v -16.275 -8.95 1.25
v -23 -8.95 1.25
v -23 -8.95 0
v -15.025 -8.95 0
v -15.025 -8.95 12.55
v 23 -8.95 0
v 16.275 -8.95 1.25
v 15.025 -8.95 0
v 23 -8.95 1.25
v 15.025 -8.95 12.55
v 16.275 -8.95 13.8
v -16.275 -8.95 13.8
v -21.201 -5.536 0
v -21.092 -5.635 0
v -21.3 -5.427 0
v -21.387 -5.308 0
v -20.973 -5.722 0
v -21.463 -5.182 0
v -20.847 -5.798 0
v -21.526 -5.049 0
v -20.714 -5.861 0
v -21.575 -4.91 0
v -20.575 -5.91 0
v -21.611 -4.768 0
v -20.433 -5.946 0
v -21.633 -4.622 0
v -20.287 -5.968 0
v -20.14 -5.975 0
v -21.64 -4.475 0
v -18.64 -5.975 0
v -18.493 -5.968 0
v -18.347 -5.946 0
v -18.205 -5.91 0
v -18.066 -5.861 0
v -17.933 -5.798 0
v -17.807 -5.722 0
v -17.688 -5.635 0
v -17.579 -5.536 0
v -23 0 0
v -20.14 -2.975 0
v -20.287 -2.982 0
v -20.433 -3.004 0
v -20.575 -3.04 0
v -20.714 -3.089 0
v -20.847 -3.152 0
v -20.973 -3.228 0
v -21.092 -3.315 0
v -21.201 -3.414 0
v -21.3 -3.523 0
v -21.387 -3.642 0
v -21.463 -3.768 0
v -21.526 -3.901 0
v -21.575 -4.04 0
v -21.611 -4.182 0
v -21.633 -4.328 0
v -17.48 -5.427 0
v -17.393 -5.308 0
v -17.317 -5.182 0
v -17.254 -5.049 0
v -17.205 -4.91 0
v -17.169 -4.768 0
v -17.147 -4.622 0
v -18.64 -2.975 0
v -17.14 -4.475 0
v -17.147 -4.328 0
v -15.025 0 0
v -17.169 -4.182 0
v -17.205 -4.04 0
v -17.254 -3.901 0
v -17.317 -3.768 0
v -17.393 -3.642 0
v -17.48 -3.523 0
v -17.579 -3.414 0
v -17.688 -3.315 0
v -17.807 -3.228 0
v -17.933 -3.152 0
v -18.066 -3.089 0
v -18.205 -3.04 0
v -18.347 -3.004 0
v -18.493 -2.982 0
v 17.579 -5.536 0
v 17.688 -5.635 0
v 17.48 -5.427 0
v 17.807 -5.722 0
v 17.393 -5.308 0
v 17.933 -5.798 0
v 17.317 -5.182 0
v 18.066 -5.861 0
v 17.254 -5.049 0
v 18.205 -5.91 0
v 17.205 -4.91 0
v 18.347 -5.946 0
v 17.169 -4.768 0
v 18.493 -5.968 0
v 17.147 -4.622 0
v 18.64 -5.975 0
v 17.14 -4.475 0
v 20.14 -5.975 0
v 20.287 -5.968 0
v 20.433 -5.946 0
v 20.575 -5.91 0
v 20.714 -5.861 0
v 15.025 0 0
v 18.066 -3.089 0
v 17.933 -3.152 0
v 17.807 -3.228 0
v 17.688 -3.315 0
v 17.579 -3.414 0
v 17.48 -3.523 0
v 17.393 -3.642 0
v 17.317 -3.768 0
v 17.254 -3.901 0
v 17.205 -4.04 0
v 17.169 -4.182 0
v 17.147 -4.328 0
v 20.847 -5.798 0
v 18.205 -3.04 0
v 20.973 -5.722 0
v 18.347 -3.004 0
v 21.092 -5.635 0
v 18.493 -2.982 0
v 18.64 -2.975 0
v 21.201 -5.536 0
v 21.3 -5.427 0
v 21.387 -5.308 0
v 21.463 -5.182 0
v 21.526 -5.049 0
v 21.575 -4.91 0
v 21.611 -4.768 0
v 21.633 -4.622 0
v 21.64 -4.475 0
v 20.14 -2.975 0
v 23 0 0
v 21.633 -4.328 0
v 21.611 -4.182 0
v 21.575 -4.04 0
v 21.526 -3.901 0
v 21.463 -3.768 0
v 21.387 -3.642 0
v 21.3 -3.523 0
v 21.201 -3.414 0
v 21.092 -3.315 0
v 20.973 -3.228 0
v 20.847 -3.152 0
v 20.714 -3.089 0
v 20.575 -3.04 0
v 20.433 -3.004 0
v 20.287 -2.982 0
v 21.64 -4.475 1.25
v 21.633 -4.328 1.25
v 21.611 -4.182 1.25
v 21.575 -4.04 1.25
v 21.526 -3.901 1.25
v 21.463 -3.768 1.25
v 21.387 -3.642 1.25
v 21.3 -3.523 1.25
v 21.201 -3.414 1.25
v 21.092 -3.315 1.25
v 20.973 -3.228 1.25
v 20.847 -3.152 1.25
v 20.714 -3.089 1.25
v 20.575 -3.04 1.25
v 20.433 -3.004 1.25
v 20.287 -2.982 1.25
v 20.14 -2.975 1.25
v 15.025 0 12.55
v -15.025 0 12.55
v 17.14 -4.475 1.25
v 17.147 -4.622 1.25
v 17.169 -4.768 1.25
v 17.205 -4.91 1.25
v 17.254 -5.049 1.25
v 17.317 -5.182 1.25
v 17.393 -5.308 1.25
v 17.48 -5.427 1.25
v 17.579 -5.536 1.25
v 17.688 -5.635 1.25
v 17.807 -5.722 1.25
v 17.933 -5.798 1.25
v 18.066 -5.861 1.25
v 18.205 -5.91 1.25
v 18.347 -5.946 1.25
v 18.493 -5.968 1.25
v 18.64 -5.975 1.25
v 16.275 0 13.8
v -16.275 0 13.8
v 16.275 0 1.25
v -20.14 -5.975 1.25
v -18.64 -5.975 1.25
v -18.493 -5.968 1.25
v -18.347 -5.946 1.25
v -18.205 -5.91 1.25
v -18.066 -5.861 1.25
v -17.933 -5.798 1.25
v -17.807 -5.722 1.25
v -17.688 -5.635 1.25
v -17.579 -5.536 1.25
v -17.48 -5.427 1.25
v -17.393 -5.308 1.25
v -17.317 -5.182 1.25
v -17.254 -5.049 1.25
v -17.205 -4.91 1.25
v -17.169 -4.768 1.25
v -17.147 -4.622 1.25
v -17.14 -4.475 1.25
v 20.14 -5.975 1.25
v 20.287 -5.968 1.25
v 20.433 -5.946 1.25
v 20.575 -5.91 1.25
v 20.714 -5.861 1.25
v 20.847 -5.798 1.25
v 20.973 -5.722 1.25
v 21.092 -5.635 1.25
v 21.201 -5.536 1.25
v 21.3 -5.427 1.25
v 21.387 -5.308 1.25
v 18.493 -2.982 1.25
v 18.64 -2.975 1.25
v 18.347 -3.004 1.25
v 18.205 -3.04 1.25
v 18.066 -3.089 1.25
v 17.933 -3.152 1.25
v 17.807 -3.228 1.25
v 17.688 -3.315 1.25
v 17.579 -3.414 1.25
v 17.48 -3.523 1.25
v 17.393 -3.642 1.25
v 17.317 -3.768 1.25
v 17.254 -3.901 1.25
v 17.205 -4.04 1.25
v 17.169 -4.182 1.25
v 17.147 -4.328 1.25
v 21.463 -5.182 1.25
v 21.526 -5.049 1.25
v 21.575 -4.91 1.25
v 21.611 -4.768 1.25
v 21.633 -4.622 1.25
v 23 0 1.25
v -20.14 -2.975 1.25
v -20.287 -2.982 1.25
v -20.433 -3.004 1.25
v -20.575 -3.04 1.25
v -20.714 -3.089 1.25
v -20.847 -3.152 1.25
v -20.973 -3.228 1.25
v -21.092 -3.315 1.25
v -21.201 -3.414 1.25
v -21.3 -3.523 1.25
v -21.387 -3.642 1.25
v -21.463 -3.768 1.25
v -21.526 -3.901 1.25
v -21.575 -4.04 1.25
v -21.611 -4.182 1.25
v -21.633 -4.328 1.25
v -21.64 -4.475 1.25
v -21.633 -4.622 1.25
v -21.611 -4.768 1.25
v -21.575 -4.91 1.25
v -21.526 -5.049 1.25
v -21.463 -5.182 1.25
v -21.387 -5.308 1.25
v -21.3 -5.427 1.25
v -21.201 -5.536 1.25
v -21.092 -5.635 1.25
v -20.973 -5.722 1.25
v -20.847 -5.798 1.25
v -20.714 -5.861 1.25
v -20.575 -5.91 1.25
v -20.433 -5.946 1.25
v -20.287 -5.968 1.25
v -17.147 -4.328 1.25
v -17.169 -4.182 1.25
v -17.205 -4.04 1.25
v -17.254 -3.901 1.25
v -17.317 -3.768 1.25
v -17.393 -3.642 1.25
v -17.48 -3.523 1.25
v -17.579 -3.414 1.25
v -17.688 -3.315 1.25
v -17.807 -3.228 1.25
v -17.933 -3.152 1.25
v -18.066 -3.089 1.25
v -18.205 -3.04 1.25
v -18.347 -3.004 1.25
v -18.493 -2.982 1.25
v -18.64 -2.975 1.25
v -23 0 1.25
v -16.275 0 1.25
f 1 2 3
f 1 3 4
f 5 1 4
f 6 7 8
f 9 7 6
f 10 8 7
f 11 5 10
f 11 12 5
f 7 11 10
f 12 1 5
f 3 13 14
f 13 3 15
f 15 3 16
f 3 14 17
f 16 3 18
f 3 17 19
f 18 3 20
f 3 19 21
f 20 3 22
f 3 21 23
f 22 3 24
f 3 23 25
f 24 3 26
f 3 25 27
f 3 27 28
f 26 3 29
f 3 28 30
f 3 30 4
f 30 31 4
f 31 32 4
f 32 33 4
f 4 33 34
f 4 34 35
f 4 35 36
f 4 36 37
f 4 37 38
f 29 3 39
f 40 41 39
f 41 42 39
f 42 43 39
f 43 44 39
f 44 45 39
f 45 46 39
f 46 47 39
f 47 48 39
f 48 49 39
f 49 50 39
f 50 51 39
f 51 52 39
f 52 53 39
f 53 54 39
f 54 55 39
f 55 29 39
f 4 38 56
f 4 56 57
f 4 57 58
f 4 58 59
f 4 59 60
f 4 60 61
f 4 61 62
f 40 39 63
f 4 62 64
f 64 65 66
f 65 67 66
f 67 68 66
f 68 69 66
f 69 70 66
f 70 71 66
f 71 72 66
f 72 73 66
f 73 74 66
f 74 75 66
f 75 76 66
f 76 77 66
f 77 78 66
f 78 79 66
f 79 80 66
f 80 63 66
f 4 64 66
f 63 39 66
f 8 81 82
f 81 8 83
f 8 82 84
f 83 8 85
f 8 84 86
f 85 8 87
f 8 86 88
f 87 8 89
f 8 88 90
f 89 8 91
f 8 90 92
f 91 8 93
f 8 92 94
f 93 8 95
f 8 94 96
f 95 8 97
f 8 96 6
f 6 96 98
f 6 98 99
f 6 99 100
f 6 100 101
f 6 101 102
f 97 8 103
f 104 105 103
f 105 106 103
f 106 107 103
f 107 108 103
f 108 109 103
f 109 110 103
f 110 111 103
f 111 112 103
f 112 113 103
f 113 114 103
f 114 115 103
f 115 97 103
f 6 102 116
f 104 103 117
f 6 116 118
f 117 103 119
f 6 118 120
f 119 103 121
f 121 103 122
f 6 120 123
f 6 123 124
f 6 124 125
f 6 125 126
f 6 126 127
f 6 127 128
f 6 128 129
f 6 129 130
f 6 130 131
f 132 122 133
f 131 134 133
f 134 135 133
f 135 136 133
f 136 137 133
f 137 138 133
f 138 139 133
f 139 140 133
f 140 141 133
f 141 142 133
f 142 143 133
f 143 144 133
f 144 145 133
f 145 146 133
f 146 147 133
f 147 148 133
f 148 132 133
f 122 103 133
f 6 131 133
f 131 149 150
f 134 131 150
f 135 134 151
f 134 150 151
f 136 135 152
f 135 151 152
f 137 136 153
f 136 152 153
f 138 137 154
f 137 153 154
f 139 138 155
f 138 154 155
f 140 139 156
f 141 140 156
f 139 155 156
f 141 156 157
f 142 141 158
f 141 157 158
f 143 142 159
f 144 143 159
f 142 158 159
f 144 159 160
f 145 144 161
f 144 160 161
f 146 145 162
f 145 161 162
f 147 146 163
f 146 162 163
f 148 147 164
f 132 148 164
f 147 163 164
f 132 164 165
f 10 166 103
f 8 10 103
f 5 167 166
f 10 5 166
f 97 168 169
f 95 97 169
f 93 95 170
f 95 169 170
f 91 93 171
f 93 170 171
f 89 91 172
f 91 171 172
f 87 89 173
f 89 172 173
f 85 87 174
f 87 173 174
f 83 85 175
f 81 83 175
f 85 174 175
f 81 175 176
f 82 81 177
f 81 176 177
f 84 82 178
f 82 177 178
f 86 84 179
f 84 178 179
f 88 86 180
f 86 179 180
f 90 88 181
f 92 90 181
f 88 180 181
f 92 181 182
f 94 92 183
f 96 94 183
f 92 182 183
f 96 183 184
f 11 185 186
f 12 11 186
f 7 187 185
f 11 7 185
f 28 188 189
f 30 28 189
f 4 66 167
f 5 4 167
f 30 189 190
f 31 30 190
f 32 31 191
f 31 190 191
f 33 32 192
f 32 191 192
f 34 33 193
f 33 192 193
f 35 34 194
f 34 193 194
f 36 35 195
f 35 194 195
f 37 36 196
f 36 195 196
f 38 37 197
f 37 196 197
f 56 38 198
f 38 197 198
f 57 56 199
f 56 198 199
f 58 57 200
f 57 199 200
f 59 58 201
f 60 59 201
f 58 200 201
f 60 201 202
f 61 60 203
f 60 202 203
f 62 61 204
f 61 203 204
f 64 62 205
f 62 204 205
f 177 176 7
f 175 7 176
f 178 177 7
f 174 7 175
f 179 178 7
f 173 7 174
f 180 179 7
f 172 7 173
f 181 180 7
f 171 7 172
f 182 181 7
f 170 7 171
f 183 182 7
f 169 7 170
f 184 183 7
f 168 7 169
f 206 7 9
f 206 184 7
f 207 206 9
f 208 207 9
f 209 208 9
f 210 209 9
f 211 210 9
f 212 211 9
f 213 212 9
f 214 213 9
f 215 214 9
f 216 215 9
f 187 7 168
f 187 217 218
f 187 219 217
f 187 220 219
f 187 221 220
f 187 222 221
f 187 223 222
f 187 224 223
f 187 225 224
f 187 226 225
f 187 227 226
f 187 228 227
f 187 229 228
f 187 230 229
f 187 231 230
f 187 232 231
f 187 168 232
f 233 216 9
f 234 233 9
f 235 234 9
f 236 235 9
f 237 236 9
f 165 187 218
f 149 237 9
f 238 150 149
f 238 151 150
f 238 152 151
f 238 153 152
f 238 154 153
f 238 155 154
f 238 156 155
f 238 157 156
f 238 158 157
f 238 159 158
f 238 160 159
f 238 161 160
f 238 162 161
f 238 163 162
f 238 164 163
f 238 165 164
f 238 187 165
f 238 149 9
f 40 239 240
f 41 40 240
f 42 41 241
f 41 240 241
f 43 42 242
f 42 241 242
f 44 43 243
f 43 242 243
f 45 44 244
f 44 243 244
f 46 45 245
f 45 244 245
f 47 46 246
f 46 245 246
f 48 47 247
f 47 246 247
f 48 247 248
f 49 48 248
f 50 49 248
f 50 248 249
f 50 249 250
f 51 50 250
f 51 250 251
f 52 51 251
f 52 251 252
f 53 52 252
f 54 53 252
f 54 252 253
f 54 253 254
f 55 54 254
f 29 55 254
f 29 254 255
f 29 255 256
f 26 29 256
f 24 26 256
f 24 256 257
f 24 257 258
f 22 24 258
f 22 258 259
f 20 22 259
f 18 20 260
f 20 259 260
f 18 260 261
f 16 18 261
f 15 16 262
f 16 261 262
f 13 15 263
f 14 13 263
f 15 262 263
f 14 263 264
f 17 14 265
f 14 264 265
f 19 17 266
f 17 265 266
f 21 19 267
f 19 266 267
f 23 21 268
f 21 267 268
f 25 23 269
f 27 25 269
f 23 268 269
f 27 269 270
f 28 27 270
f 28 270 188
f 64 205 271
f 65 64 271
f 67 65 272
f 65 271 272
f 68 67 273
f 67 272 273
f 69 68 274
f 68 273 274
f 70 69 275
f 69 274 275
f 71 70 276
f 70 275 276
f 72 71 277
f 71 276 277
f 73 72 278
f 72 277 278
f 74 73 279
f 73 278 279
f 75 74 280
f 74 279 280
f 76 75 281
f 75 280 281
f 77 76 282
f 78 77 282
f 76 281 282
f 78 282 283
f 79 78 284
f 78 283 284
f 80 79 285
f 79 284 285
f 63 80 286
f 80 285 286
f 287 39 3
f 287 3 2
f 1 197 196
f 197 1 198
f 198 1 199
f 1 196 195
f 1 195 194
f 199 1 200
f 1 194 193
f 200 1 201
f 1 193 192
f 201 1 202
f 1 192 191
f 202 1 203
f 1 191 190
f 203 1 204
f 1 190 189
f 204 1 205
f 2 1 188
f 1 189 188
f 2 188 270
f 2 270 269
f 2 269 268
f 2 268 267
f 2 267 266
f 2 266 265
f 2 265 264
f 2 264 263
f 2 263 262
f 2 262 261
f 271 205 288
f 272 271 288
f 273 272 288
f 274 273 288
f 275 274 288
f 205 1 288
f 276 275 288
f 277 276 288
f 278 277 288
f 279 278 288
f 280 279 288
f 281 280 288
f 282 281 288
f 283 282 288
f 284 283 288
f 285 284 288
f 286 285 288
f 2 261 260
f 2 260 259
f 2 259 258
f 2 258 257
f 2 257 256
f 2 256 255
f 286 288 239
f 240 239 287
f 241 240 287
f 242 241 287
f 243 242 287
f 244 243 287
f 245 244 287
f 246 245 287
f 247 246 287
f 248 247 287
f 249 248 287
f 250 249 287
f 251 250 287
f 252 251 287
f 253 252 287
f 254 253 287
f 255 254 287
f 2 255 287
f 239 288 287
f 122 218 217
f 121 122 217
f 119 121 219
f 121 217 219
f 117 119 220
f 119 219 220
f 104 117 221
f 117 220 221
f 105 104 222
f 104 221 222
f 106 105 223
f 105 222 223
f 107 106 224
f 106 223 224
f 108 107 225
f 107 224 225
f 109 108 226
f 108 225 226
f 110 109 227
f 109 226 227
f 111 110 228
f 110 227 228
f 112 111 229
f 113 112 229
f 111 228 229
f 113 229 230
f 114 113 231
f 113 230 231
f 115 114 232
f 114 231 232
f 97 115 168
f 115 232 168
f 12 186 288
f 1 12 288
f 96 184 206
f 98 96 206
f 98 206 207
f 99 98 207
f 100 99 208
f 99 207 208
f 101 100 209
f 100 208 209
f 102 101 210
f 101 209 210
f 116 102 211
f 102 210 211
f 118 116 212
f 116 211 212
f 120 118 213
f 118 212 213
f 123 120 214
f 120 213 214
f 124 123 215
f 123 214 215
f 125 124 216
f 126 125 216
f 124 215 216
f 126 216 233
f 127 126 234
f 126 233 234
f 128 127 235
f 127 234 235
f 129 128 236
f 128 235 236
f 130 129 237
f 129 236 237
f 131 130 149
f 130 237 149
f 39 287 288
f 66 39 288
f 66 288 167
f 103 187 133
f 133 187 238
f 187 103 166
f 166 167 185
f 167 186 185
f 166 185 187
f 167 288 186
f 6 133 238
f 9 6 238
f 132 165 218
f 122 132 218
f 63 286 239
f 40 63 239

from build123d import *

# Parameters (mm, degrees)
F0_W     = 6.725
F0_H     = 1.25
F0_W_2   = 1.25
F1_DEPTH = 8.95
F3_DEPTH = 25


with BuildPart() as f1:
    # F0 (on Front) → F1 (new body)
    with BuildSketch(Plane.XZ):
        with Locations((-19.6375, 0.625)):
            Rectangle(F0_W, F0_H)
        with Locations((-15.65, 0.625)):
            Rectangle(F0_W_2, F0_H)
        Polygon((-16.275, 13.8), (-16.275, 1.25), (-15.025, 1.25), (-15.025, 12.55), (15.025, 12.55), (15.025, 1.25), (16.275, 1.25), (16.275, 13.8), align=None)
        with Locations((15.65, 0.625)):
            Rectangle(F0_W_2, F0_H)
        with Locations((19.6375, 0.625)):
            Rectangle(F0_W, F0_H)
    extrude(amount=F1_DEPTH)

    # F2 (on face) → F3 (cut)
    with BuildSketch(Plane.XY.offset(1.25)):
        with BuildLine():
            ThreePointArc((-19.39, -3.1759618943), (-19.0282285677, -3.0261112606), (-18.64, -2.975))
            Line((-18.64, -2.975), (-20.14, -2.975))
            ThreePointArc((-20.14, -2.975), (-19.7517714323, -3.0261112606), (-19.39, -3.1759618943))
        make_face()
        with BuildLine():
            ThreePointArc((-19.39, -5.7740381057), (-20.14, -4.475), (-19.39, -3.1759618943))
            ThreePointArc((-19.39, -3.1759618943), (-19.7517714323, -3.0261112606), (-20.14, -2.975))
            ThreePointArc((-20.14, -2.975), (-21.64, -4.475), (-20.14, -5.975))
            ThreePointArc((-20.14, -5.975), (-19.7517714323, -5.9238887394), (-19.39, -5.7740381057))
        make_face()
        with BuildLine():
            ThreePointArc((-19.39, -5.7740381057), (-18.8409618943, -5.225), (-18.64, -4.475))
            ThreePointArc((-18.64, -4.475), (-18.8409618943, -3.725), (-19.39, -3.1759618943))
            ThreePointArc((-19.39, -3.1759618943), (-20.14, -4.475), (-19.39, -5.7740381057))
        make_face()
        with BuildLine():
            Line((-18.64, -4.475), (-17.14, -4.475))
            ThreePointArc((-17.14, -4.475), (-17.5793398282, -3.4143398282), (-18.64, -2.975))
            ThreePointArc((-18.64, -2.975), (-19.0282285677, -3.0261112606), (-19.39, -3.1759618943))
            ThreePointArc((-19.39, -3.1759618943), (-18.8409618943, -3.725), (-18.64, -4.475))
        make_face()
        with BuildLine():
            ThreePointArc((-18.64, -5.975), (-17.5793398282, -5.5356601718), (-17.14, -4.475))
            Line((-17.14, -4.475), (-18.64, -4.475))
            ThreePointArc((-18.64, -4.475), (-18.8409618943, -5.225), (-19.39, -5.7740381057))
            ThreePointArc((-19.39, -5.7740381057), (-19.0282285677, -5.9238887394), (-18.64, -5.975))
        make_face()
        with BuildLine():
            Line((-20.14, -5.975), (-18.64, -5.975))
            ThreePointArc((-18.64, -5.975), (-19.0282285677, -5.9238887394), (-19.39, -5.7740381057))
            ThreePointArc((-19.39, -5.7740381057), (-19.7517714323, -5.9238887394), (-20.14, -5.975))
        make_face()
        with BuildLine():
            Line((20.14, -2.975), (18.64, -2.975))
            ThreePointArc((18.64, -2.975), (19.0282285677, -3.0261112606), (19.39, -3.1759618943))
            ThreePointArc((19.39, -3.1759618943), (19.7517714323, -3.0261112606), (20.14, -2.975))
        make_face()
        with BuildLine():
            ThreePointArc((18.64, -2.975), (17.5793398282, -3.4143398282), (17.14, -4.475))
            Line((17.14, -4.475), (18.64, -4.475))
            ThreePointArc((18.64, -4.475), (18.8409618943, -3.725), (19.39, -3.1759618943))
            ThreePointArc((19.39, -3.1759618943), (19.0282285677, -3.0261112606), (18.64, -2.975))
        make_face()
        with BuildLine():
            ThreePointArc((19.39, -3.1759618943), (18.8409618943, -3.725), (18.64, -4.475))
            ThreePointArc((18.64, -4.475), (18.8409618943, -5.225), (19.39, -5.7740381057))
            ThreePointArc((19.39, -5.7740381057), (19.9390381057, -5.225), (20.14, -4.475))
            ThreePointArc((20.14, -4.475), (19.9390381057, -3.725), (19.39, -3.1759618943))
        make_face()
        with BuildLine():
            ThreePointArc((20.14, -2.975), (19.7517714323, -3.0261112606), (19.39, -3.1759618943))
            ThreePointArc((19.39, -3.1759618943), (19.9390381057, -3.725), (20.14, -4.475))
            ThreePointArc((20.14, -4.475), (19.9390381057, -5.225), (19.39, -5.7740381057))
            ThreePointArc((19.39, -5.7740381057), (19.7517714323, -5.9238887394), (20.14, -5.975))
            ThreePointArc((20.14, -5.975), (21.2006601718, -5.5356601718), (21.64, -4.475))
            ThreePointArc((21.64, -4.475), (21.2006601718, -3.4143398282), (20.14, -2.975))
        make_face()
        with BuildLine():
            ThreePointArc((19.39, -5.7740381057), (19.0282285677, -5.9238887394), (18.64, -5.975))
            Line((18.64, -5.975), (20.14, -5.975))
            ThreePointArc((20.14, -5.975), (19.7517714323, -5.9238887394), (19.39, -5.7740381057))
        make_face()
        with BuildLine():
            Line((18.64, -4.475), (17.14, -4.475))
            ThreePointArc((17.14, -4.475), (17.5793398282, -5.5356601718), (18.64, -5.975))
            ThreePointArc((18.64, -5.975), (19.0282285677, -5.9238887394), (19.39, -5.7740381057))
            ThreePointArc((19.39, -5.7740381057), (18.8409618943, -5.225), (18.64, -4.475))
        make_face()
    extrude(amount=-F3_DEPTH, mode=Mode.SUBTRACT)


solid = f1.part
